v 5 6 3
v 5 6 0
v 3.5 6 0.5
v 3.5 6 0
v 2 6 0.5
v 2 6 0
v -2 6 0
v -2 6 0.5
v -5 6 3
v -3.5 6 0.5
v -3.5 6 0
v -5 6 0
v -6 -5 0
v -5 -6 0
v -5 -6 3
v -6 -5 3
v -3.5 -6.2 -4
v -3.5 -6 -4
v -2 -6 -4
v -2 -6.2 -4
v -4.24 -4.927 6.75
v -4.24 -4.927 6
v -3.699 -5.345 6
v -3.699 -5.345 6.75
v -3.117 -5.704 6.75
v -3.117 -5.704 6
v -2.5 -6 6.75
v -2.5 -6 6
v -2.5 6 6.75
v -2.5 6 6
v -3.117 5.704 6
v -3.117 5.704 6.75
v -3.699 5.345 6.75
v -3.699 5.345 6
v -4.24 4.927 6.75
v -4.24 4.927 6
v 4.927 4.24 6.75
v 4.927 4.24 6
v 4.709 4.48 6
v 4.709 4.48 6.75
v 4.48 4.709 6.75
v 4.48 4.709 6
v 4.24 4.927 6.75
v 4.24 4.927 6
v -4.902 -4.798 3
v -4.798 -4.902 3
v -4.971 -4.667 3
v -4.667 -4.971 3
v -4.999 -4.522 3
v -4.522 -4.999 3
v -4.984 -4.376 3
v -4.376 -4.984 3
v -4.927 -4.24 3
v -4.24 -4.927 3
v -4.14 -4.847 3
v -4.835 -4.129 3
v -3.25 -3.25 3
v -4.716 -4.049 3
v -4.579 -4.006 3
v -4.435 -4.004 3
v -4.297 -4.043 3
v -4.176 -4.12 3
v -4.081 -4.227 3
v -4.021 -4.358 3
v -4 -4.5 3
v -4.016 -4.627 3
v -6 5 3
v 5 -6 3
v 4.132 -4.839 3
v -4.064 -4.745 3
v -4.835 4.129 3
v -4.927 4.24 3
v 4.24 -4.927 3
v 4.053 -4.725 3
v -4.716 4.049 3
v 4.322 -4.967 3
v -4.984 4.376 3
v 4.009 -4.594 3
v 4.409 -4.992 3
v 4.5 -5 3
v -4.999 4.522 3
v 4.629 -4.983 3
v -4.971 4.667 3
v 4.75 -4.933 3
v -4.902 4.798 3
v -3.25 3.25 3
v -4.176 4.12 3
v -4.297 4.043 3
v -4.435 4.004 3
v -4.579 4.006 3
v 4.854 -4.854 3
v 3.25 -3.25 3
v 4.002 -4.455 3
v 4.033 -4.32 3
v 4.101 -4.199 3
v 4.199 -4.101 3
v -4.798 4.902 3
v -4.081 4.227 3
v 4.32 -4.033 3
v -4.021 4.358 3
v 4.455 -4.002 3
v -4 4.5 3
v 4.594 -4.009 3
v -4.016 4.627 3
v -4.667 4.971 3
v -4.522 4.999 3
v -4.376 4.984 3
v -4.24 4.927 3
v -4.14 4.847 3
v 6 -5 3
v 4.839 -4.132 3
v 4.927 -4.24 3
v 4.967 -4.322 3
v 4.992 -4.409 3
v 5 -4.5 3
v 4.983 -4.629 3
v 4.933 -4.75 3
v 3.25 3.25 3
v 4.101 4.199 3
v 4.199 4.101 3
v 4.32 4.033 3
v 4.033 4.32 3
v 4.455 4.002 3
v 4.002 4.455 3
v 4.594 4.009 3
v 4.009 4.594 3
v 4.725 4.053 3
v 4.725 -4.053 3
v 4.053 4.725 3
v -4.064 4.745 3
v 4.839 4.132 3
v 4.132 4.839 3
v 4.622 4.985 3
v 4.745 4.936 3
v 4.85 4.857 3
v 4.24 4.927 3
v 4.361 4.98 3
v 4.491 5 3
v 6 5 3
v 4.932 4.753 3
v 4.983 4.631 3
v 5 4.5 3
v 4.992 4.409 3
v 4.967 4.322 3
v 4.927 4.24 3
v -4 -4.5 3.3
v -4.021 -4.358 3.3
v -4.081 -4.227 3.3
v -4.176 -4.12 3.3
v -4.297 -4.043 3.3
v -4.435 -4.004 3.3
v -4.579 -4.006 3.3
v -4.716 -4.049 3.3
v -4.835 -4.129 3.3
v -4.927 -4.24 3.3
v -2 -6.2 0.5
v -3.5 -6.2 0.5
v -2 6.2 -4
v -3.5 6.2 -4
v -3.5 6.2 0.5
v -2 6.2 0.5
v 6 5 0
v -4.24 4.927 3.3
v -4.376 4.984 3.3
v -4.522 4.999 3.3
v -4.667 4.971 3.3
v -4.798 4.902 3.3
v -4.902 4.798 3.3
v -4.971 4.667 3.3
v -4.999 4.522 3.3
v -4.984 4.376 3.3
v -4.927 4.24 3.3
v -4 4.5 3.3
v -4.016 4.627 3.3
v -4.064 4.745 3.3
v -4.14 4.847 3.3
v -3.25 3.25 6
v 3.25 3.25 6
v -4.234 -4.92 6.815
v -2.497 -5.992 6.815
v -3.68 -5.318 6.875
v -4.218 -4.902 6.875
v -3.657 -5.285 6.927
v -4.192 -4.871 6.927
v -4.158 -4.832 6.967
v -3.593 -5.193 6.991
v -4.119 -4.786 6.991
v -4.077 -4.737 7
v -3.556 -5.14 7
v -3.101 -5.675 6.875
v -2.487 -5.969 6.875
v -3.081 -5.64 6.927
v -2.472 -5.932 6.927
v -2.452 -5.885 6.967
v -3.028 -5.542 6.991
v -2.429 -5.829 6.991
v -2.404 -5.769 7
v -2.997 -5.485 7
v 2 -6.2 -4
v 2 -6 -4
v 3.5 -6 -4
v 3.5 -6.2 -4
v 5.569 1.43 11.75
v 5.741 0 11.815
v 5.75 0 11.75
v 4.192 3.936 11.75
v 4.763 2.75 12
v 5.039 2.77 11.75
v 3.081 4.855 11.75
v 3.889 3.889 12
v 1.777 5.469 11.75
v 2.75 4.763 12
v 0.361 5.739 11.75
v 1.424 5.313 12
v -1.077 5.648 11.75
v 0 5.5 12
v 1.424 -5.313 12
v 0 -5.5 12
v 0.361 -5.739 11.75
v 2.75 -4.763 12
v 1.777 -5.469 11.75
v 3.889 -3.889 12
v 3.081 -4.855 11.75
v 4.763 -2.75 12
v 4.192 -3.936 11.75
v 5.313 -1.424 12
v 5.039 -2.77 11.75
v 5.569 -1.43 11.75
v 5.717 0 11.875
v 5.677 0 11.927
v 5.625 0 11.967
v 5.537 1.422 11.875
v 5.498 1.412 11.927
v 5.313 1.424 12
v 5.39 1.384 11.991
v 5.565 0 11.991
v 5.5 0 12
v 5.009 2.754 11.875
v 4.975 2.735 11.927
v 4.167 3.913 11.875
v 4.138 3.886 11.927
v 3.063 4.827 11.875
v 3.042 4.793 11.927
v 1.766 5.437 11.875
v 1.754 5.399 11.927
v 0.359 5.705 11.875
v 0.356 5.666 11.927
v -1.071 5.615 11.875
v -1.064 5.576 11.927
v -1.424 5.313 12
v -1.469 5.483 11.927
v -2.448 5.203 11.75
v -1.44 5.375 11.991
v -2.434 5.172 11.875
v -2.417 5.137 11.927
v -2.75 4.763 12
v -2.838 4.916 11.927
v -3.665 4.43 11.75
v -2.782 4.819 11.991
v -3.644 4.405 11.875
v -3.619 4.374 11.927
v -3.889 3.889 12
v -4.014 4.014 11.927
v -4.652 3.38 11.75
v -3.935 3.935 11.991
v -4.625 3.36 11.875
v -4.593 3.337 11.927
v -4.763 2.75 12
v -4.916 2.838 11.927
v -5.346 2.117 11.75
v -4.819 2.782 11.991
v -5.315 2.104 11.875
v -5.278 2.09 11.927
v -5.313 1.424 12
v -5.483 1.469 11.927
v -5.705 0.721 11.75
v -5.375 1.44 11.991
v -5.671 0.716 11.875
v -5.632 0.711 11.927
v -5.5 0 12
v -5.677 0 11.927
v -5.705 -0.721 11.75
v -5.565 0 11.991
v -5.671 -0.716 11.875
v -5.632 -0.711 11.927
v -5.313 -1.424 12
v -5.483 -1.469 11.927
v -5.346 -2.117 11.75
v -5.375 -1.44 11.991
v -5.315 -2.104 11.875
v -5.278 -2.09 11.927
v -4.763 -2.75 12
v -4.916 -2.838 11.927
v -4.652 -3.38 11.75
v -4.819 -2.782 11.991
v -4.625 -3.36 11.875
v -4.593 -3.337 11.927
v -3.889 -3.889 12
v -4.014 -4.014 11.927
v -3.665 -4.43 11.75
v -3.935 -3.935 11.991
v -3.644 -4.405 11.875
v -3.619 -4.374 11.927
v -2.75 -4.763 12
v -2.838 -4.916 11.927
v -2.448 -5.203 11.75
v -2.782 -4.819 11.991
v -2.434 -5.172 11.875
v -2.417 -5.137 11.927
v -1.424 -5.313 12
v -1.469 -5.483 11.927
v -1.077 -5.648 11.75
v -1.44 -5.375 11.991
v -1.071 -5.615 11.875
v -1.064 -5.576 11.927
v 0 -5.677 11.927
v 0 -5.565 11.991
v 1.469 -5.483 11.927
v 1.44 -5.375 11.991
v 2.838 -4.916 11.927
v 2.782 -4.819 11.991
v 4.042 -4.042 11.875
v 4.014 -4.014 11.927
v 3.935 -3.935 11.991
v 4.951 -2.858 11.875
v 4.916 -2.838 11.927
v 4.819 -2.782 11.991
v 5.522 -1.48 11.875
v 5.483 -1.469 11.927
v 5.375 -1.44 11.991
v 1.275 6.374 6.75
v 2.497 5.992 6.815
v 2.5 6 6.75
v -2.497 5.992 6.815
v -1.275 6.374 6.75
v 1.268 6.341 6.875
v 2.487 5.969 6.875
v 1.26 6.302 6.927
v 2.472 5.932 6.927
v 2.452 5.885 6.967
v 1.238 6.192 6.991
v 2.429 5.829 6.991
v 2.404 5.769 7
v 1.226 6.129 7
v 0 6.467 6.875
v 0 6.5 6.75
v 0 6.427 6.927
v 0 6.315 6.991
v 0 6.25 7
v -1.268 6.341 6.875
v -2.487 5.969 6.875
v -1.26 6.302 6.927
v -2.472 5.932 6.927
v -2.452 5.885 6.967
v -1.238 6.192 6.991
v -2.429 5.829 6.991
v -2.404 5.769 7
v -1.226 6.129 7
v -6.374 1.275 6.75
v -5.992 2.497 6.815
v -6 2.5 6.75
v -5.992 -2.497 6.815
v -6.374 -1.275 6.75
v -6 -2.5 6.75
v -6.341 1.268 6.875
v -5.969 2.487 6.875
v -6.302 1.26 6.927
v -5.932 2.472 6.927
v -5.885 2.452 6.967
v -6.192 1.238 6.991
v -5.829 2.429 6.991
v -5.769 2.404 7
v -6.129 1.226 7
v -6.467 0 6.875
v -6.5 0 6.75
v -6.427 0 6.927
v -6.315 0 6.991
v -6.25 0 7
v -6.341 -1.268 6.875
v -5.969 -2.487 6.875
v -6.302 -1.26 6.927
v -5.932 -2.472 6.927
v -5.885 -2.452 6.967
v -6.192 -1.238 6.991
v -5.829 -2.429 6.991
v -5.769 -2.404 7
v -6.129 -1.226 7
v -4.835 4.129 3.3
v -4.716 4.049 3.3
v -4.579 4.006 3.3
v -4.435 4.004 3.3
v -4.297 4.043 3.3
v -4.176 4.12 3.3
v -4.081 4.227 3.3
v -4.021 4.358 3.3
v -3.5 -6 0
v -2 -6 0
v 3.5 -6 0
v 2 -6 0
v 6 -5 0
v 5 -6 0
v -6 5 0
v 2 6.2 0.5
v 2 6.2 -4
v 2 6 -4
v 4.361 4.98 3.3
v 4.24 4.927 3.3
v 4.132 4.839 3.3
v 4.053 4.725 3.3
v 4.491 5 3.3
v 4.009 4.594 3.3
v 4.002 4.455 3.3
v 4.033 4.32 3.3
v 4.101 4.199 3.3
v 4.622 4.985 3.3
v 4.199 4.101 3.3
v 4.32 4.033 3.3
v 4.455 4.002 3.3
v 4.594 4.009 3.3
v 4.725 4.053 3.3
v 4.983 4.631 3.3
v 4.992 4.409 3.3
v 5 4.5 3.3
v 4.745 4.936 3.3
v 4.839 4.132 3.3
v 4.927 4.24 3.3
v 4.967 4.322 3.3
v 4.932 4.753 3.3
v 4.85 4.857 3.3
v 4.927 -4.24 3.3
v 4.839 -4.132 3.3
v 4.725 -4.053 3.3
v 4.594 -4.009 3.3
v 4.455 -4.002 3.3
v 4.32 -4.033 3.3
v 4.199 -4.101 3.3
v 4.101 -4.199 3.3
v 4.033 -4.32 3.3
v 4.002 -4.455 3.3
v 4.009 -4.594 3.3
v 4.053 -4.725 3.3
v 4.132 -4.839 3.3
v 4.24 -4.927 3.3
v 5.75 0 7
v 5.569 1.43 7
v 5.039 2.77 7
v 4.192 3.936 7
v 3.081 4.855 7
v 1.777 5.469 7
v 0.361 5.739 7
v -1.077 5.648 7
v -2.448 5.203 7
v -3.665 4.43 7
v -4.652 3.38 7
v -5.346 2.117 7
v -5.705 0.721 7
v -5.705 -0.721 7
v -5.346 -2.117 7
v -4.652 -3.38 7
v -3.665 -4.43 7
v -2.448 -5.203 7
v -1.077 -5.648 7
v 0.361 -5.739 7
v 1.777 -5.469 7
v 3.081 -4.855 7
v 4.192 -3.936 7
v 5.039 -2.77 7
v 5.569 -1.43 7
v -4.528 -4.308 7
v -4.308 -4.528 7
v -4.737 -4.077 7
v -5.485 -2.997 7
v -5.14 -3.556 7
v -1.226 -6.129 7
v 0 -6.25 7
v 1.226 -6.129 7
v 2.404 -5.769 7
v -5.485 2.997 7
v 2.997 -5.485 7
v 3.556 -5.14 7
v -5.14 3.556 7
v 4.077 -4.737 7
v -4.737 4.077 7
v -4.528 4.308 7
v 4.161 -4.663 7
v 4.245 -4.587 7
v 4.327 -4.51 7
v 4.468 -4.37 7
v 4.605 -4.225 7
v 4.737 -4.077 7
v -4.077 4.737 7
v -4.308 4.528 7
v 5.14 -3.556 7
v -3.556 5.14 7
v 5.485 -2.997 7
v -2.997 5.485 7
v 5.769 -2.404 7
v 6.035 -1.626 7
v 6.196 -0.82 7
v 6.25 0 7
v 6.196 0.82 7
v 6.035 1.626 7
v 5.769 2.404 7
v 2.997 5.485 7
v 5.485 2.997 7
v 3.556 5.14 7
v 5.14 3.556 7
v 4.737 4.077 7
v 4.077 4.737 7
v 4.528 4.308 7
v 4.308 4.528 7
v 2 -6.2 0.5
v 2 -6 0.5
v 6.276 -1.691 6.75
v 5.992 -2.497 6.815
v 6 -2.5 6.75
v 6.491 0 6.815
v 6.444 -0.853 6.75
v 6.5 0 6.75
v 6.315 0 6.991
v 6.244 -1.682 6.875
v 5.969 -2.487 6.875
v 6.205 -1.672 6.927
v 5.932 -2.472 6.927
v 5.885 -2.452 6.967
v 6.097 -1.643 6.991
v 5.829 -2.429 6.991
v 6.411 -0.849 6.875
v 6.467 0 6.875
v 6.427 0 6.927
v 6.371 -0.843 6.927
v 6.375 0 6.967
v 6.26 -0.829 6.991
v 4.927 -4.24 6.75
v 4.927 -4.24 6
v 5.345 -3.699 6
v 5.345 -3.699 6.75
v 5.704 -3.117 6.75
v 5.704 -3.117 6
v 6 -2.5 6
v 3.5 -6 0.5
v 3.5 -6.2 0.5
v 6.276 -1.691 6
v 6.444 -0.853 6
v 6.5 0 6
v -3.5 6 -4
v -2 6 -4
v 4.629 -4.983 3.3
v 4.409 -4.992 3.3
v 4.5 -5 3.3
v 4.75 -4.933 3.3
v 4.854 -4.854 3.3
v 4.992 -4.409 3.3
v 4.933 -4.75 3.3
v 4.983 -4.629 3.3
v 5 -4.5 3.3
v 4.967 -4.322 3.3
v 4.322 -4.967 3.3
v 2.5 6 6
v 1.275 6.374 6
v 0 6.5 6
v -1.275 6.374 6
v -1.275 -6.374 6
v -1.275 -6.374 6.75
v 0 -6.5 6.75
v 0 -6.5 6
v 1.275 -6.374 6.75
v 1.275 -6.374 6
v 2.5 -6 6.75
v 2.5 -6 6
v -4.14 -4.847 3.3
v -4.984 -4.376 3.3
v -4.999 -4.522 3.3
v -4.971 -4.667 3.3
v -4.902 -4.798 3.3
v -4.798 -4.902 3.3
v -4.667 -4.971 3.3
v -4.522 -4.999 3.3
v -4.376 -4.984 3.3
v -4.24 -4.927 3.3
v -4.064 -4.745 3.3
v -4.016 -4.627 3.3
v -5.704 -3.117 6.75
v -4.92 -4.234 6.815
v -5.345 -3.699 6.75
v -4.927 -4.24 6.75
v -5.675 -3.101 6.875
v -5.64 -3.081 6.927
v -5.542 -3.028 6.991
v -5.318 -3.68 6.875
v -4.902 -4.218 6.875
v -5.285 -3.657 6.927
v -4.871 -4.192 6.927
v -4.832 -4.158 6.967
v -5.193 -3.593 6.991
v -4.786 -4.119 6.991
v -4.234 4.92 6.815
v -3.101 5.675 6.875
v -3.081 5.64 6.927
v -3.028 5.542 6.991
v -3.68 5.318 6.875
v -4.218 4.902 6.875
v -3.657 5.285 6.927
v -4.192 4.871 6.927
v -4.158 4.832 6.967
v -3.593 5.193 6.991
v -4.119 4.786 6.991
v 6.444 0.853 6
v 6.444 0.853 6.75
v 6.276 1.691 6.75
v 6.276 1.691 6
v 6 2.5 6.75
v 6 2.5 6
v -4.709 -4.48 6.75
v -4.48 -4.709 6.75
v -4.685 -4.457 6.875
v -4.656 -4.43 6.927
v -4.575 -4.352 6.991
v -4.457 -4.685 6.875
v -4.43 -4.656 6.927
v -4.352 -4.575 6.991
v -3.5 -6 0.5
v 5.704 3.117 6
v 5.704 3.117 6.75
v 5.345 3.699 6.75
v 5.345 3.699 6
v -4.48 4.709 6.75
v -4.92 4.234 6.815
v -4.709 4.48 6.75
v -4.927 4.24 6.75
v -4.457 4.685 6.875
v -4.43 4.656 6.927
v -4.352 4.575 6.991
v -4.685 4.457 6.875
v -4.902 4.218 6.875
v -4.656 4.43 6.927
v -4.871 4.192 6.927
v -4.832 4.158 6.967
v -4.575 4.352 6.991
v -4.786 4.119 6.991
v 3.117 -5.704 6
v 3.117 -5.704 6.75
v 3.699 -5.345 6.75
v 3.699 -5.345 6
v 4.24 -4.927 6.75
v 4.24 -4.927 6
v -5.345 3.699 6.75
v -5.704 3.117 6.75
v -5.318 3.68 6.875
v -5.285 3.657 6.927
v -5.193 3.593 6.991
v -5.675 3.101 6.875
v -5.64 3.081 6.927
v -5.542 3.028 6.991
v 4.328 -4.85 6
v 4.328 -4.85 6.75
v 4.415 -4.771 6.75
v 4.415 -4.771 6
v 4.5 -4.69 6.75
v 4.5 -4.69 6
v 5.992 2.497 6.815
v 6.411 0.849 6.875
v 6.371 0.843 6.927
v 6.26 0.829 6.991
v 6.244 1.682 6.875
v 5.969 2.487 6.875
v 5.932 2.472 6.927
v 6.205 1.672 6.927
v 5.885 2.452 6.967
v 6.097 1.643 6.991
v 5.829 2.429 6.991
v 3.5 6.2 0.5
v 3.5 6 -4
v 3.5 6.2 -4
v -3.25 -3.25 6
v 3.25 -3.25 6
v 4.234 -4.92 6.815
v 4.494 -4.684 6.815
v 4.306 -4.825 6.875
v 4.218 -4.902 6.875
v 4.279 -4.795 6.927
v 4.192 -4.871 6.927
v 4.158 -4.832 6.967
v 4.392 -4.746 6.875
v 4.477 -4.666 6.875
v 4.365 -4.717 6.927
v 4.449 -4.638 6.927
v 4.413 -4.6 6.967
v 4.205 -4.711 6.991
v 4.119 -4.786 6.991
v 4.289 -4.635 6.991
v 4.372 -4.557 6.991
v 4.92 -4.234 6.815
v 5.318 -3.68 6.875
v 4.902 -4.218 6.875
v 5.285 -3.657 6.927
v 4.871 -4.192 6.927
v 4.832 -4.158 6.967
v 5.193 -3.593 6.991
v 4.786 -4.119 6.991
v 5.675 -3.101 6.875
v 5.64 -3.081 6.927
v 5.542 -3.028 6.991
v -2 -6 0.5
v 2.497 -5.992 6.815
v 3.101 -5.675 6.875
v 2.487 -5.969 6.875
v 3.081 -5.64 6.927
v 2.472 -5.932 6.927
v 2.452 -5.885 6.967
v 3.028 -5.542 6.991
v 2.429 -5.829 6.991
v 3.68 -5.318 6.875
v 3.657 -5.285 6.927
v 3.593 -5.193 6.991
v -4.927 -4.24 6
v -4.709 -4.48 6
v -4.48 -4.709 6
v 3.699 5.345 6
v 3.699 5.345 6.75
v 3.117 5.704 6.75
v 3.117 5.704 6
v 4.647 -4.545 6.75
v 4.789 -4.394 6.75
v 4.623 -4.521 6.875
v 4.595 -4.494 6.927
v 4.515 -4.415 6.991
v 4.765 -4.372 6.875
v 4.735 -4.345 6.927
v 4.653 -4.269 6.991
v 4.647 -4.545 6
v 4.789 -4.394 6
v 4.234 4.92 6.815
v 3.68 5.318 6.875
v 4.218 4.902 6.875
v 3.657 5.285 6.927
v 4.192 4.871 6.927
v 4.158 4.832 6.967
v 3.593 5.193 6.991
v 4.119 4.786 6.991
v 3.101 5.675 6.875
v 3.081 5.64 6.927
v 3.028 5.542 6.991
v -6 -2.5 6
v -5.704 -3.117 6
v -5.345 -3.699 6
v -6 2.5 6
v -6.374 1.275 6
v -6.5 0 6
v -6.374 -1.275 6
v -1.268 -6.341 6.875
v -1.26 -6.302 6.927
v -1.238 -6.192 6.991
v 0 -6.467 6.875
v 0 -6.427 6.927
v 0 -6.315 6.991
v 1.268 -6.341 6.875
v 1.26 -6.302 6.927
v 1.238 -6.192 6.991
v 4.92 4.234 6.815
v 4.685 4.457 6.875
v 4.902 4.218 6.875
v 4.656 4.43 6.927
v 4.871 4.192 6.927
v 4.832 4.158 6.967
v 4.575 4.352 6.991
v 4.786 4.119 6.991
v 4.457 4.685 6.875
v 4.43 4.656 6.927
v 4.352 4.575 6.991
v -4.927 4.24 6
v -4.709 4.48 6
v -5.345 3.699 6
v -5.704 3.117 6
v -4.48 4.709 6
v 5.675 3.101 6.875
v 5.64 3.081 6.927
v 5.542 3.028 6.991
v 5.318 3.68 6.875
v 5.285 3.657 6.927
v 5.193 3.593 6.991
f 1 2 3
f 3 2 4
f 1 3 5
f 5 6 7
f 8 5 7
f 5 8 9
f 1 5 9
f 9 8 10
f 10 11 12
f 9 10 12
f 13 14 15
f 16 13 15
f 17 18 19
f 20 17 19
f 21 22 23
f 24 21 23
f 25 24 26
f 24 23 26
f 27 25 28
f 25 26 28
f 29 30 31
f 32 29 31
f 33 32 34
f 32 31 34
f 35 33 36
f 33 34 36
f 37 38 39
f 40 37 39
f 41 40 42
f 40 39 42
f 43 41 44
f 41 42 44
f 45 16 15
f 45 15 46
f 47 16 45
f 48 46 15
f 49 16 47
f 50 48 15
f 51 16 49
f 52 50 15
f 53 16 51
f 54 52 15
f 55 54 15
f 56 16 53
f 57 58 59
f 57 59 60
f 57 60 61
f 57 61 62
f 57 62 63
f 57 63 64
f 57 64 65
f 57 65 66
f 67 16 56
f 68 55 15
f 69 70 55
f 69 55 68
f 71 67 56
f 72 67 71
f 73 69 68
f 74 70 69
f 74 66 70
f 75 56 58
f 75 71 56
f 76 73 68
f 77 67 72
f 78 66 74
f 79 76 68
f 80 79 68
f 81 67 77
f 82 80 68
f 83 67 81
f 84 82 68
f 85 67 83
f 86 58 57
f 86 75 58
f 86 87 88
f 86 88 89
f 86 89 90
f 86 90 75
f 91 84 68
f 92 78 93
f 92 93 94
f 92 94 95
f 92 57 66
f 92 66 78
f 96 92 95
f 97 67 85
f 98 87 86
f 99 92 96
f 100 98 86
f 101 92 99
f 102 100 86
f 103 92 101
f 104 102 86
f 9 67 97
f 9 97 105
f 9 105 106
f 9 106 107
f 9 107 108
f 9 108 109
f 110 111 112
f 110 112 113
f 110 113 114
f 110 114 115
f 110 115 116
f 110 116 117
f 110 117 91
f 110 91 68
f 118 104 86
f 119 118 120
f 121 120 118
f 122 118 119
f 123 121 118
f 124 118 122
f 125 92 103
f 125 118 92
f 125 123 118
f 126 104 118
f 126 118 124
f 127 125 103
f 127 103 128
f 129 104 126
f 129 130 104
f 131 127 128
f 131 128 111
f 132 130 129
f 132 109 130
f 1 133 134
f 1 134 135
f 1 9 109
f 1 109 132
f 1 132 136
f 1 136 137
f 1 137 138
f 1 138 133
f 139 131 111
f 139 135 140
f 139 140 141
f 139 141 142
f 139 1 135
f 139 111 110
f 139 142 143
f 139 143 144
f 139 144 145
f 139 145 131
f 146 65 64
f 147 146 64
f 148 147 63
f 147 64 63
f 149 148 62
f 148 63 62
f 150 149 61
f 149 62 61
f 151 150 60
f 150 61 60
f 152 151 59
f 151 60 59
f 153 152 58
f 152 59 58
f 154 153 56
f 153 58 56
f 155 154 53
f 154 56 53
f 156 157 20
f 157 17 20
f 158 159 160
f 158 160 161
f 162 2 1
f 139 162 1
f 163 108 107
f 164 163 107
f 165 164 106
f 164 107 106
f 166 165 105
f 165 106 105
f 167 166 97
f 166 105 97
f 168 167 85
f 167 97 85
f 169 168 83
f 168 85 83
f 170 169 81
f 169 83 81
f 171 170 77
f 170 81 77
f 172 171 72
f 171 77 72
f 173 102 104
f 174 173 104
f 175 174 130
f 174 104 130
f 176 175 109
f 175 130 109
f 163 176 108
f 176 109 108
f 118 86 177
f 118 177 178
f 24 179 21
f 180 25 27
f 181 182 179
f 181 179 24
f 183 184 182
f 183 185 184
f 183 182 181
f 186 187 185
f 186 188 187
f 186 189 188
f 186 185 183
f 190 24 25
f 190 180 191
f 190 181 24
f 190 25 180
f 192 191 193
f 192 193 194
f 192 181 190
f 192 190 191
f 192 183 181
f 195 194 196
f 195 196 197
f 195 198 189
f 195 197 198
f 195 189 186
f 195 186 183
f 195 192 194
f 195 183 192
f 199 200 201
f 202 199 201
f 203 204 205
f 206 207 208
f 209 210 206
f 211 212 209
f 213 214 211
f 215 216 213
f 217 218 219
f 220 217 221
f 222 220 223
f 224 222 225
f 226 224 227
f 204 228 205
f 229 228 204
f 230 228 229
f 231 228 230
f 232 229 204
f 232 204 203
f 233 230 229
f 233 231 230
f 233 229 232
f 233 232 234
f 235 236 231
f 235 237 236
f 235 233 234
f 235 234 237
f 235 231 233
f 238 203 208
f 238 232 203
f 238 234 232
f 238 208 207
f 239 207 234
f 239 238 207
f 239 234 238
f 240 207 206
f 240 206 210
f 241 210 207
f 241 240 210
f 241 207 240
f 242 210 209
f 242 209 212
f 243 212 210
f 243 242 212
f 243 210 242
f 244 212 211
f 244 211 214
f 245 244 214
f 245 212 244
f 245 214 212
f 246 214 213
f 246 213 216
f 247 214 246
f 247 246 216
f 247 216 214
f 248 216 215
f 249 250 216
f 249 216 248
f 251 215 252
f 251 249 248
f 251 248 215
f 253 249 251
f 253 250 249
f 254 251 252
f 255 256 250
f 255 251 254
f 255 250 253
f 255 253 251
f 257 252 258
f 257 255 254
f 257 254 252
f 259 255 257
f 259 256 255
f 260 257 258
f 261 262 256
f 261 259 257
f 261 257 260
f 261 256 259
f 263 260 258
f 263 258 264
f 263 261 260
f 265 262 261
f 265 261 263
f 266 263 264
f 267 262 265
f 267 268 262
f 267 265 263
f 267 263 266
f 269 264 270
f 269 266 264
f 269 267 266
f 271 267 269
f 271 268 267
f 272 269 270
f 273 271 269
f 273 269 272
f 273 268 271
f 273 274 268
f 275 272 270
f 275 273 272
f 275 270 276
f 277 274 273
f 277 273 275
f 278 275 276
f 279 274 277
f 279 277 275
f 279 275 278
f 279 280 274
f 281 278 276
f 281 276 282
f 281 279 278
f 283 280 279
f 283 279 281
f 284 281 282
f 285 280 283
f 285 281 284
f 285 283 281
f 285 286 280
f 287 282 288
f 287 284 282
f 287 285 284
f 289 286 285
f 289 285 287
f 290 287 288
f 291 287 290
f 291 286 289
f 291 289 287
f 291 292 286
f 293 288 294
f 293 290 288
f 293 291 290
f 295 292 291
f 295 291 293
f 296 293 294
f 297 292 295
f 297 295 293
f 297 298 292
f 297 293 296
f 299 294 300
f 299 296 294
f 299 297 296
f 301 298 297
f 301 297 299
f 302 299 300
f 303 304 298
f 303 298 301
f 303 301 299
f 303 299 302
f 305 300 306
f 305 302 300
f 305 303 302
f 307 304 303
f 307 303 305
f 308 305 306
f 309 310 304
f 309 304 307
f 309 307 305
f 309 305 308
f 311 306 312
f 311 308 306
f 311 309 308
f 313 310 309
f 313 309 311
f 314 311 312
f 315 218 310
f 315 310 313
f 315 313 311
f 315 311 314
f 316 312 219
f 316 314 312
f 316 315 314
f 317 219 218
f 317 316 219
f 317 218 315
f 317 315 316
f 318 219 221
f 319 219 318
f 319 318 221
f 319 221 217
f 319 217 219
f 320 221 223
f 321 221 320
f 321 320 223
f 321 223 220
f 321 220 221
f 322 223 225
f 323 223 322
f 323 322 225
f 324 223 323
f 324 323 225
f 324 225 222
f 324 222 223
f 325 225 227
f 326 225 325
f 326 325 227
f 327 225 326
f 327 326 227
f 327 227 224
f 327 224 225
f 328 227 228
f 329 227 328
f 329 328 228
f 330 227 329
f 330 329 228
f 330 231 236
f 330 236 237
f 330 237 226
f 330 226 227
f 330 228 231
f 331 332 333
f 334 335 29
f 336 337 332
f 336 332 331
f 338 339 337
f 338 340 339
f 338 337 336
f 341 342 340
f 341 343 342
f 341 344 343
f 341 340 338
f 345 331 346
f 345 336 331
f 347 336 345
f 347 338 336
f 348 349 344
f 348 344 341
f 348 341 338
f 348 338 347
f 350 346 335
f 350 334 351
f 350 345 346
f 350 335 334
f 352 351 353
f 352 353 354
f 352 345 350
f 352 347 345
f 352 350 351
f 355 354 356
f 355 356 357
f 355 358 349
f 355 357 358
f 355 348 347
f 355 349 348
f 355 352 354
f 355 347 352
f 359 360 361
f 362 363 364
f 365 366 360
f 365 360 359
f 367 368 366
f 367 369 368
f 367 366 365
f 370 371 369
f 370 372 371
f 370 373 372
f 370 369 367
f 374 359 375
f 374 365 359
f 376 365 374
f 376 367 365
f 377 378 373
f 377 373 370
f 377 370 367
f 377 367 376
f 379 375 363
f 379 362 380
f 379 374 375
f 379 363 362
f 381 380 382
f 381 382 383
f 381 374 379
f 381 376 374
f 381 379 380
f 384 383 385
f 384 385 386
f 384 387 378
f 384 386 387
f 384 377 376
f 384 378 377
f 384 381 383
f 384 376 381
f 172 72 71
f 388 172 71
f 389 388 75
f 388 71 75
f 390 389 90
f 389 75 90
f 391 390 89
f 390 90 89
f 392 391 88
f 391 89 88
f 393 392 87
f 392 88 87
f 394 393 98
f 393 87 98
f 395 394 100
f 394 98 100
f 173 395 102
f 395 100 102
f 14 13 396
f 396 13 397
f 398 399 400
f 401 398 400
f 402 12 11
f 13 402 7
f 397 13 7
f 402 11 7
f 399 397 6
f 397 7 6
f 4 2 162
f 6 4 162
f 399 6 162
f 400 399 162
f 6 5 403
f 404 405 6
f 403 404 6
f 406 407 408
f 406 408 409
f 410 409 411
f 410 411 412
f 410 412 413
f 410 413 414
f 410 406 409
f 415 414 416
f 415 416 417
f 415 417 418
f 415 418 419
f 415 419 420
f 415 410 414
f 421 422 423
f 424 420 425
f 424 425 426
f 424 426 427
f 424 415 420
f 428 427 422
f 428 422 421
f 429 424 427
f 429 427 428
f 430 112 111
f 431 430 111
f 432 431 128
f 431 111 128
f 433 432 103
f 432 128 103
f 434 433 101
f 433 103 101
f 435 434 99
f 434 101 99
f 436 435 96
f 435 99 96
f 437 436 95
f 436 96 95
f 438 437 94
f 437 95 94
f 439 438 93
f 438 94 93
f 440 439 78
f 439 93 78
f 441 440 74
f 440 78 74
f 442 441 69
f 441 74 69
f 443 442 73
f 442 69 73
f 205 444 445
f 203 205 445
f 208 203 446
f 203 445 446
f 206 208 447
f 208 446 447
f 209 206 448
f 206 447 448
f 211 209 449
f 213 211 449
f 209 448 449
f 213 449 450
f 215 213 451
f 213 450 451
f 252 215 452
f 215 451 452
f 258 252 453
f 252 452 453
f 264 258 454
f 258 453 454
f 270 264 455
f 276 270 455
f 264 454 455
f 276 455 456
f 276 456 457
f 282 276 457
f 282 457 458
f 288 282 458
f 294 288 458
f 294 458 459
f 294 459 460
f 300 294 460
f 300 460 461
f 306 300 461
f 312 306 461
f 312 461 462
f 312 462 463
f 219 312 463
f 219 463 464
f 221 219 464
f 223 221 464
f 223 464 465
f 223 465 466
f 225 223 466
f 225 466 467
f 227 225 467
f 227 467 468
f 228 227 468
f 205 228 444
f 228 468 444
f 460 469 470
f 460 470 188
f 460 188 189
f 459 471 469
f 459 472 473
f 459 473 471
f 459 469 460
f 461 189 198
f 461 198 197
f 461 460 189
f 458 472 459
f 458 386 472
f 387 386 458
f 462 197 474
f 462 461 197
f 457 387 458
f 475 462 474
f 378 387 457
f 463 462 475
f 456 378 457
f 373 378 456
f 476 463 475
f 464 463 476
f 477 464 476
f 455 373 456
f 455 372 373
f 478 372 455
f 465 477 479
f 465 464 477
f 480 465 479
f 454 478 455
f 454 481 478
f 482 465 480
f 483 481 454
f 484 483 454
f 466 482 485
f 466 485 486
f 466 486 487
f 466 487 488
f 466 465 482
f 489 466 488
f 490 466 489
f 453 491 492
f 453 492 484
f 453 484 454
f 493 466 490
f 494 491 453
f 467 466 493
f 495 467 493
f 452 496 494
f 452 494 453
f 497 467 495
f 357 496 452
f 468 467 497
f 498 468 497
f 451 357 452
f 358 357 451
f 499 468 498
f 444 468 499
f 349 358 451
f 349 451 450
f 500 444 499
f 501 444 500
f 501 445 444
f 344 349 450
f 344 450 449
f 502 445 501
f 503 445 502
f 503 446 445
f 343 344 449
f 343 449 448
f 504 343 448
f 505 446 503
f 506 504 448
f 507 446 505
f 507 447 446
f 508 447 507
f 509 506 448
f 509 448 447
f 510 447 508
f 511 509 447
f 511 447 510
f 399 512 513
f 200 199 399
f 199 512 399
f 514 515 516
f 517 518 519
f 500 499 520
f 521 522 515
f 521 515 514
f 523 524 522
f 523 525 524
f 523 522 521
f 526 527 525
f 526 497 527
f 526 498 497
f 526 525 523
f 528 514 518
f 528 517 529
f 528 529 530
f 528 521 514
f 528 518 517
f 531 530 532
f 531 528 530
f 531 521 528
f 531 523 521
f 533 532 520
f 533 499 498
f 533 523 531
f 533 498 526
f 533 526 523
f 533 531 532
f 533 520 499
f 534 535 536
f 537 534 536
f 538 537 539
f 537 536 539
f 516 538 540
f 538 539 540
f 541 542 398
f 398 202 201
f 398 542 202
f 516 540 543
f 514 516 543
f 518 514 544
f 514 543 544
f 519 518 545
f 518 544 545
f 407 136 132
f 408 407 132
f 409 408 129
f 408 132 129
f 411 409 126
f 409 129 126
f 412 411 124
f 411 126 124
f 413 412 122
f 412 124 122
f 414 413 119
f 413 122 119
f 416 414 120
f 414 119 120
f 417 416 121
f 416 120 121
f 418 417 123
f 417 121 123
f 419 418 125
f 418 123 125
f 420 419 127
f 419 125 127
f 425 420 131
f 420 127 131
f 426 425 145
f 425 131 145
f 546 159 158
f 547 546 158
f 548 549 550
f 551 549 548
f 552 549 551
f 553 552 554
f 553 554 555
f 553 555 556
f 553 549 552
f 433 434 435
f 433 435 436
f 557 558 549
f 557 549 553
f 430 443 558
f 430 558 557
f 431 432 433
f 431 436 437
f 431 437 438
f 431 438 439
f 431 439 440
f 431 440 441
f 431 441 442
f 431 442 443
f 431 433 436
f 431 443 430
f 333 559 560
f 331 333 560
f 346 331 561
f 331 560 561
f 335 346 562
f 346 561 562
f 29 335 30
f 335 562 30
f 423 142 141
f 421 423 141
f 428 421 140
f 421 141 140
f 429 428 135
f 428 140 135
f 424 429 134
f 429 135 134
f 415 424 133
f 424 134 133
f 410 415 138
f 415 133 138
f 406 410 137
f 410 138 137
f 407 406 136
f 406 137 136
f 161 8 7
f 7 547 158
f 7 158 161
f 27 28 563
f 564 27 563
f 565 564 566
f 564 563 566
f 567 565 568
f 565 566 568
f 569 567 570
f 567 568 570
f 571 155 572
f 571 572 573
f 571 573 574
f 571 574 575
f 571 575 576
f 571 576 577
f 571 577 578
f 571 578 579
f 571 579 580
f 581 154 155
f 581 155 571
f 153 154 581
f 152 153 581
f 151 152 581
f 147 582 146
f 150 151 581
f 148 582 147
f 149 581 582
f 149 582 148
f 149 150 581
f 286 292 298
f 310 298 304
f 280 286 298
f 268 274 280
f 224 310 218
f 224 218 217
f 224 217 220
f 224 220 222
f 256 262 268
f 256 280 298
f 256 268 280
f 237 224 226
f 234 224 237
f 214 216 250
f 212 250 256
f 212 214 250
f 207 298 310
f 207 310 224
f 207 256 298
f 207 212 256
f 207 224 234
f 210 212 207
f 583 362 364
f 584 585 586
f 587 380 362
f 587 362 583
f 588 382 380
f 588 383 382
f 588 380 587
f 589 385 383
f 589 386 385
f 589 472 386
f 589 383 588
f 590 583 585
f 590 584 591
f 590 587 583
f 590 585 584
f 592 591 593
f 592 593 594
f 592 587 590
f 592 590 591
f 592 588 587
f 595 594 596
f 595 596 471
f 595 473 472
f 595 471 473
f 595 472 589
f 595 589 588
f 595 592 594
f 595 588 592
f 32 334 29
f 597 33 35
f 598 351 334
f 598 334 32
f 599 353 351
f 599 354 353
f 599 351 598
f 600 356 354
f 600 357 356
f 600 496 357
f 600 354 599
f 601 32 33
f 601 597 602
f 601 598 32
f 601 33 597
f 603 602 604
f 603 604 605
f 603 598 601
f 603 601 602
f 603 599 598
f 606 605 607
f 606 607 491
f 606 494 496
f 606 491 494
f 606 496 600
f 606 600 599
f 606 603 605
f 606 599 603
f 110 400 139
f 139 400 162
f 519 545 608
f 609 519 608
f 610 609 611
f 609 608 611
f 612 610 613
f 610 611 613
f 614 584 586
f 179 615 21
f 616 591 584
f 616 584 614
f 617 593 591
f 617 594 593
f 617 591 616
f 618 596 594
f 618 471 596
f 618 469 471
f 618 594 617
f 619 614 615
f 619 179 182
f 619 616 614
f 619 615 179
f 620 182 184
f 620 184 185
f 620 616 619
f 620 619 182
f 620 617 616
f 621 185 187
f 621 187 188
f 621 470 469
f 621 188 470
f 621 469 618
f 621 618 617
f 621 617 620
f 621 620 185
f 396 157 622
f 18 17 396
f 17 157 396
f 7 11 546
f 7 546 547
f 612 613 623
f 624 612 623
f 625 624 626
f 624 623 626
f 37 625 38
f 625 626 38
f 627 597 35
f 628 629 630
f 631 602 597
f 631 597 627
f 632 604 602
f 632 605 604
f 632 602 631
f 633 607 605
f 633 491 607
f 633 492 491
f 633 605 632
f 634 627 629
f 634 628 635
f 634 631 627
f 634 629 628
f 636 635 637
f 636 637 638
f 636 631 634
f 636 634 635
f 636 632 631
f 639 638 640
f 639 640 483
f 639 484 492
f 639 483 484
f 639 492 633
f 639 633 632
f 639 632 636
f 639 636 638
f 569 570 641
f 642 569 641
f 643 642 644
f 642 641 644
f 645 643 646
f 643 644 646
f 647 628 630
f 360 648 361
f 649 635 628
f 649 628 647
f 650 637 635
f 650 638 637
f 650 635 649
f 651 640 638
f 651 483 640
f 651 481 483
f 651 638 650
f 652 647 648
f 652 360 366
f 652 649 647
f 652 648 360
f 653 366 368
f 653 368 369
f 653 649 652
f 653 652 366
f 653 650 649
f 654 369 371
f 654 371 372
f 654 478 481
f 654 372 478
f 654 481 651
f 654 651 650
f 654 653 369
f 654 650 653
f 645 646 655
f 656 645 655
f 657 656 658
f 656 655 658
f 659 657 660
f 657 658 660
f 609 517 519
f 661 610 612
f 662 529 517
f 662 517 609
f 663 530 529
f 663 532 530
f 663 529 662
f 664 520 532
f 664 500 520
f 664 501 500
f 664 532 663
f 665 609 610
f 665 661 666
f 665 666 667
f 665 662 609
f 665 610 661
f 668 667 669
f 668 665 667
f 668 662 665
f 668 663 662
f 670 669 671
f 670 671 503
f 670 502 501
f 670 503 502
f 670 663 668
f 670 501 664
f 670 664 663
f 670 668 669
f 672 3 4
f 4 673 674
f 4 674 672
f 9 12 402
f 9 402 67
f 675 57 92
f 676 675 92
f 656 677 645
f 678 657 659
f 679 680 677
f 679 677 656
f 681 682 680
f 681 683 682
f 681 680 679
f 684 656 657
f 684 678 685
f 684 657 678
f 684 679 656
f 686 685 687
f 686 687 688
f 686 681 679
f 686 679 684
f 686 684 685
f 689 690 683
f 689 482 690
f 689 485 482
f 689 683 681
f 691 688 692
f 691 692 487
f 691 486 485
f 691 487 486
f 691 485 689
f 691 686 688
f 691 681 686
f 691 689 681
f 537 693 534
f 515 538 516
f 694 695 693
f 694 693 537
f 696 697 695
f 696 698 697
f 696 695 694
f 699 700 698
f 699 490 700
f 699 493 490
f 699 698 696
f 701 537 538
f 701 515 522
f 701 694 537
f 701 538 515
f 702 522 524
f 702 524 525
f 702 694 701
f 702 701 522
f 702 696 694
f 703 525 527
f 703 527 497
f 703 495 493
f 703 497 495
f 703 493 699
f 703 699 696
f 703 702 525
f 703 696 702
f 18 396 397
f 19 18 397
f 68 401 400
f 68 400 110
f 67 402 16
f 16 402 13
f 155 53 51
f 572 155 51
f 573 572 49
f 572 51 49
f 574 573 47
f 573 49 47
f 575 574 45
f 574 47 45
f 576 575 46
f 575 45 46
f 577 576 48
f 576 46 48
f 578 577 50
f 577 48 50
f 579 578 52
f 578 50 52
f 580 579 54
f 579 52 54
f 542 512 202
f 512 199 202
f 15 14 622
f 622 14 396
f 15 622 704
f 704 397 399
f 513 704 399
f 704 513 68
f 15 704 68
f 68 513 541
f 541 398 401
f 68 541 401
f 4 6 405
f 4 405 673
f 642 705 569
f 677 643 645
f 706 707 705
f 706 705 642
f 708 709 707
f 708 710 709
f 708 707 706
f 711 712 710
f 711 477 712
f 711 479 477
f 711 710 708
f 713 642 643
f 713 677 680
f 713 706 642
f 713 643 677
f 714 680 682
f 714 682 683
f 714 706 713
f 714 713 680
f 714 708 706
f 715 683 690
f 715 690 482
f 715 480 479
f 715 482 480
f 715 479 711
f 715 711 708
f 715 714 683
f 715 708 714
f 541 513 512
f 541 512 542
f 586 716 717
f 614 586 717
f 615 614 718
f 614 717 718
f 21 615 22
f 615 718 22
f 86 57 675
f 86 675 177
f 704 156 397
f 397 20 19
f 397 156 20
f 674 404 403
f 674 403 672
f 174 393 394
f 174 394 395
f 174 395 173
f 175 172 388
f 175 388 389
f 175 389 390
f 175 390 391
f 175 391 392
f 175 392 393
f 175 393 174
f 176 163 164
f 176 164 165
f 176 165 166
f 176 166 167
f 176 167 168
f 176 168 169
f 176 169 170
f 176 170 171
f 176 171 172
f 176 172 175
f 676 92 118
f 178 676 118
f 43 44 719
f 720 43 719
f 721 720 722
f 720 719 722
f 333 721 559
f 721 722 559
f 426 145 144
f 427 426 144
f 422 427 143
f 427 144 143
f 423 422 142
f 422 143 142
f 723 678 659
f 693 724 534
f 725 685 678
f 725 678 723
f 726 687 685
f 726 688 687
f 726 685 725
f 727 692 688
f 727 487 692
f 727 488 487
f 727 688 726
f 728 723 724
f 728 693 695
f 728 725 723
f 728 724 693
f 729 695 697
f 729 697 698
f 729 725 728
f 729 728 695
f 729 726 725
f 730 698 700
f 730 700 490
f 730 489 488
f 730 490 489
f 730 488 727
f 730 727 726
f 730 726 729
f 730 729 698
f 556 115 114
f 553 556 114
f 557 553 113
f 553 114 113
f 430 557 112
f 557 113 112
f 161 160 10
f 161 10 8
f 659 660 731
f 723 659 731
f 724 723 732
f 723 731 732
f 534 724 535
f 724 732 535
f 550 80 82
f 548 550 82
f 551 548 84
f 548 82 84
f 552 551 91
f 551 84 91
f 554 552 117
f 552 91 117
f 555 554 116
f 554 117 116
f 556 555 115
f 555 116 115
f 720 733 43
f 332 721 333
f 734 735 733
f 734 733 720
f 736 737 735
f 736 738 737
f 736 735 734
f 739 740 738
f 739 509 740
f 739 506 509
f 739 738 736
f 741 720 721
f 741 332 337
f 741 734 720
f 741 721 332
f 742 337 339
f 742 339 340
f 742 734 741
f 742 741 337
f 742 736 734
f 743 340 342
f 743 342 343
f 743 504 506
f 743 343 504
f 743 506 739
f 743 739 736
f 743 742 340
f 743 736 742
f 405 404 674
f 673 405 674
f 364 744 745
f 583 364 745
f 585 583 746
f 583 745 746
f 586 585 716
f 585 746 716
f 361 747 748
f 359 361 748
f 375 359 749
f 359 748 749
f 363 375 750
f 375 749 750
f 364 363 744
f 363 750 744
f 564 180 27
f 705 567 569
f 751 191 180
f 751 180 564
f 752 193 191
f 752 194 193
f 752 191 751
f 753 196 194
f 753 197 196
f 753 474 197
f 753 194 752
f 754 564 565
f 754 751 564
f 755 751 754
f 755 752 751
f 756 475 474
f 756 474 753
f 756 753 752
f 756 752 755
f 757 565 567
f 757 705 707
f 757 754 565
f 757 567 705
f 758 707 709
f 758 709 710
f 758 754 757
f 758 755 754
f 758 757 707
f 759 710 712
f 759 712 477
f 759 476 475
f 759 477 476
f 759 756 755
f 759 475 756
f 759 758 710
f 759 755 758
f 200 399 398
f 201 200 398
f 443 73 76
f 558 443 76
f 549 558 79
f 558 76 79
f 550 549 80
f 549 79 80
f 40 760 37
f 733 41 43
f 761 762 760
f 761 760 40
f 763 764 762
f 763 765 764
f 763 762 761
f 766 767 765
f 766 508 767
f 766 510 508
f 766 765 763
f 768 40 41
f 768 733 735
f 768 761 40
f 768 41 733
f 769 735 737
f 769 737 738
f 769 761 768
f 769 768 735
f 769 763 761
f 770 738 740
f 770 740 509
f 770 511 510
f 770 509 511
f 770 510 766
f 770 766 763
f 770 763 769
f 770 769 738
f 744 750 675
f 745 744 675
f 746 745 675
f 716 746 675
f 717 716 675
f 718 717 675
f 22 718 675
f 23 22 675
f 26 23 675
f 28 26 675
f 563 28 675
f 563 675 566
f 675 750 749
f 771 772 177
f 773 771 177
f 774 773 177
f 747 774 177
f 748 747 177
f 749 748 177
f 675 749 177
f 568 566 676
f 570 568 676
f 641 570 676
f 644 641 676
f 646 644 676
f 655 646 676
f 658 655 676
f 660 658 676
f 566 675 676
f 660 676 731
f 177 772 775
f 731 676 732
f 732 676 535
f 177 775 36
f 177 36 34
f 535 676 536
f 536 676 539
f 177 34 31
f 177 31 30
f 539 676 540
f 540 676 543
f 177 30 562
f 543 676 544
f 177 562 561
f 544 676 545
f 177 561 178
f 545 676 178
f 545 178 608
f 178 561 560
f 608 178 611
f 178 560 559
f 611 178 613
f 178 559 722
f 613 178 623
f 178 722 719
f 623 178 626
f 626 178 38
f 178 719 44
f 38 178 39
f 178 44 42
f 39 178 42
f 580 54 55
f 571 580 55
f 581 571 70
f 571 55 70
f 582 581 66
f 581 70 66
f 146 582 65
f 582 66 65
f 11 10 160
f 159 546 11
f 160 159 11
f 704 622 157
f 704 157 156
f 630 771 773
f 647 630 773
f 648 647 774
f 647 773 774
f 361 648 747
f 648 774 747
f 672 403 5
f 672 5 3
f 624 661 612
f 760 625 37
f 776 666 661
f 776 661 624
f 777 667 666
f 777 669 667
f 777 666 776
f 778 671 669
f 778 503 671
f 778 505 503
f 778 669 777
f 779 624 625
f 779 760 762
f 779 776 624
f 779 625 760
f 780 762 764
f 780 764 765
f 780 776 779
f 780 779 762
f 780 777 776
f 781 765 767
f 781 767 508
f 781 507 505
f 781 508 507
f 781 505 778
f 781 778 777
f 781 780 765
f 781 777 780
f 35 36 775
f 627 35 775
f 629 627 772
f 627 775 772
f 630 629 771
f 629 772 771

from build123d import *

# Parameters (mm, degrees)
F0_R          = 5.75
F0_W          = 6.5
F0_H          = 6.5
F1_DEPTH      = 3
F2_DEPTH      = 6
F3_START      = 6
F3_DEPTH      = 6
F4_START      = 6
F4_DEPTH      = 1
F5_W          = 1.5
F5_H          = 0.2
F6_DEPTH      = 4
F6_DEPTH_BACK = 0.5
F7_SIZE       = 1
F8_DEPTH      = 3.3
F9_R          = 0.25


with BuildPart() as f1:
    # F0 (on Top) → F1 (new body)
    with BuildSketch(Plane.XY):
        with BuildLine():
            ThreePointArc((4.2397411979, 4.9269254688), (3.4123159424, 5.5322780036), (2.5, 6))
            Line((2.5, 6), (-2.5, 6))
            ThreePointArc((-2.5, 6), (-3.4123159424, 5.5322780036), (-4.2397411979, 4.9269254688))
            ThreePointArc((-4.2397411979, 4.9269254688), (-4.0640358954, 4.7448168692), (-4, 4.5))
            ThreePointArc((-4, 4.5), (-4.3648384936, 4.0186151569), (-4.9269254688, 4.2397411979))
            ThreePointArc((-4.9269254688, 4.2397411979), (-5.5322780036, 3.4123159424), (-6, 2.5))
            Line((-6, 2.5), (-6, -2.5))
            ThreePointArc((-6, -2.5), (-5.5322780036, -3.4123159424), (-4.9269254688, -4.2397411979))
            ThreePointArc((-4.9269254688, -4.2397411979), (-4.3648384936, -4.0186151569), (-4, -4.5))
            ThreePointArc((-4, -4.5), (-4.0640358954, -4.7448168692), (-4.2397411979, -4.9269254688))
            ThreePointArc((-4.2397411979, -4.9269254688), (-3.4123159424, -5.5322780036), (-2.5, -6))
            Line((-2.5, -6), (2.5, -6))
            ThreePointArc((2.5, -6), (3.4123159424, -5.5322780036), (4.2397411979, -4.9269254688))
            ThreePointArc((4.2397411979, -4.9269254688), (4.1464466094, -4.1464466094), (4.9269254688, -4.2397411979))
            ThreePointArc((4.9269254688, -4.2397411979), (5.5322780036, -3.4123159424), (6, -2.5))
            Line((6, -2.5), (6, 2.5))
            ThreePointArc((6, 2.5), (5.5322780036, 3.4123159424), (4.9269254688, 4.2397411979))
            ThreePointArc((4.9269254688, 4.2397411979), (4.1464466094, 4.1464466094), (4.2397411979, 4.9269254688))
        make_face()
        Circle(F0_R, mode=Mode.SUBTRACT)
        Circle(F0_R)
        Rectangle(F0_W, F0_H, mode=Mode.SUBTRACT)
        Rectangle(F0_W, F0_H)
        with BuildLine():
            ThreePointArc((-4.2397411979, 4.9269254688), (-3.4123159424, 5.5322780036), (-2.5, 6))
            Line((-2.5, 6), (-6, 6))
            Line((-6, 6), (-6, 2.5))
            ThreePointArc((-6, 2.5), (-5.5322780036, 3.4123159424), (-4.9269254688, 4.2397411979))
            ThreePointArc((-4.9269254688, 4.2397411979), (-4.8535533906, 4.8535533906), (-4.2397411979, 4.9269254688))
        make_face()
        with BuildLine():
            Line((6, 2.5), (6, 6))
            Line((6, 6), (2.5, 6))
            ThreePointArc((2.5, 6), (3.4123159424, 5.5322780036), (4.2397411979, 4.9269254688))
            ThreePointArc((4.2397411979, 4.9269254688), (4.7448168692, 4.9359641046), (5, 4.5))
            ThreePointArc((5, 4.5), (4.9813848431, 4.3648384936), (4.9269254688, 4.2397411979))
            ThreePointArc((4.9269254688, 4.2397411979), (5.5322780036, 3.4123159424), (6, 2.5))
        make_face()
        with BuildLine():
            ThreePointArc((-4.9269254688, -4.2397411979), (-5.5322780036, -3.4123159424), (-6, -2.5))
            Line((-6, -2.5), (-6, -6))
            Line((-6, -6), (-2.5, -6))
            ThreePointArc((-2.5, -6), (-3.4123159424, -5.5322780036), (-4.2397411979, -4.9269254688))
            ThreePointArc((-4.2397411979, -4.9269254688), (-4.8535533906, -4.8535533906), (-4.9269254688, -4.2397411979))
        make_face()
        with BuildLine():
            Line((6, -6), (6, -2.5))
            ThreePointArc((6, -2.5), (5.5322780036, -3.4123159424), (4.9269254688, -4.2397411979))
            ThreePointArc((4.9269254688, -4.2397411979), (4.9813848431, -4.3648384936), (5, -4.5))
            ThreePointArc((5, -4.5), (4.8535533906, -4.8535533906), (4.5, -5))
            Line((4.5, -5), (4.5, -6))
            Line((4.5, -6), (6, -6))
        make_face()
        with BuildLine():
            Line((2.5, -6), (4.5, -6))
            Line((4.5, -6), (4.5, -5))
            ThreePointArc((4.5, -5), (4.3648384936, -4.9813848431), (4.2397411979, -4.9269254688))
            ThreePointArc((4.2397411979, -4.9269254688), (3.4123159424, -5.5322780036), (2.5, -6))
        make_face()
        with BuildLine():
            ThreePointArc((4.9269254688, 4.2397411979), (4.5961940777, 4.5961940777), (4.2397411979, 4.9269254688))
            ThreePointArc((4.2397411979, 4.9269254688), (4.1464466094, 4.1464466094), (4.9269254688, 4.2397411979))
        make_face()
        with BuildLine():
            ThreePointArc((-4, 4.5), (-4.0640358954, 4.7448168692), (-4.2397411979, 4.9269254688))
            ThreePointArc((-4.2397411979, 4.9269254688), (-4.5961940777, 4.5961940777), (-4.9269254688, 4.2397411979))
            ThreePointArc((-4.9269254688, 4.2397411979), (-4.3648384936, 4.0186151569), (-4, 4.5))
        make_face()
        with BuildLine():
            ThreePointArc((-4, -4.5), (-4.3648384936, -4.0186151569), (-4.9269254688, -4.2397411979))
            ThreePointArc((-4.9269254688, -4.2397411979), (-4.5961940777, -4.5961940777), (-4.2397411979, -4.9269254688))
            ThreePointArc((-4.2397411979, -4.9269254688), (-4.0640358954, -4.7448168692), (-4, -4.5))
        make_face()
        with BuildLine():
            ThreePointArc((4.5, -4.6904157598), (4.7188460283, -4.4701780905), (4.9269254688, -4.2397411979))
            ThreePointArc((4.9269254688, -4.2397411979), (4.1464466094, -4.1464466094), (4.2397411979, -4.9269254688))
            ThreePointArc((4.2397411979, -4.9269254688), (4.3714703776, -4.8104310345), (4.5, -4.6904157598))
        make_face()
        with BuildLine():
            ThreePointArc((5, 4.5), (4.7448168692, 4.9359641046), (4.2397411979, 4.9269254688))
            ThreePointArc((4.2397411979, 4.9269254688), (4.5961940777, 4.5961940777), (4.9269254688, 4.2397411979))
            ThreePointArc((4.9269254688, 4.2397411979), (4.9813848431, 4.3648384936), (5, 4.5))
        make_face()
        with BuildLine():
            ThreePointArc((-4.9269254688, 4.2397411979), (-4.5961940777, 4.5961940777), (-4.2397411979, 4.9269254688))
            ThreePointArc((-4.2397411979, 4.9269254688), (-4.8535533906, 4.8535533906), (-4.9269254688, 4.2397411979))
        make_face()
        with BuildLine():
            ThreePointArc((-4.2397411979, -4.9269254688), (-4.5961940777, -4.5961940777), (-4.9269254688, -4.2397411979))
            ThreePointArc((-4.9269254688, -4.2397411979), (-4.8535533906, -4.8535533906), (-4.2397411979, -4.9269254688))
        make_face()
        with BuildLine():
            ThreePointArc((5, -4.5), (4.9813848431, -4.3648384936), (4.9269254688, -4.2397411979))
            ThreePointArc((4.9269254688, -4.2397411979), (4.7188460283, -4.4701780905), (4.5, -4.6904157598))
            Line((4.5, -4.6904157598), (4.5, -5))
            ThreePointArc((4.5, -5), (4.8535533906, -4.8535533906), (5, -4.5))
        make_face()
        with BuildLine():
            Line((4.5, -5), (4.5, -4.6904157598))
            ThreePointArc((4.5, -4.6904157598), (4.3714703776, -4.8104310345), (4.2397411979, -4.9269254688))
            ThreePointArc((4.2397411979, -4.9269254688), (4.3648384936, -4.9813848431), (4.5, -5))
        make_face()
    extrude(amount=F1_DEPTH)

    # F0 (on Top) → F2 (join)
    with BuildSketch(Plane.XY):
        Rectangle(F0_W, F0_H)
    extrude(amount=F2_DEPTH)

    # F0 (on Top) → F3 (join)
    with BuildSketch(Plane.XY.offset(F3_START)):
        Circle(F0_R)
        Rectangle(F0_W, F0_H, mode=Mode.SUBTRACT)
        Rectangle(F0_W, F0_H)
    extrude(amount=F3_DEPTH)

    # F0 (on Top) → F4 (join)
    with BuildSketch(Plane.XY.offset(F4_START)):
        with BuildLine():
            ThreePointArc((4.2397411979, 4.9269254688), (3.4123159424, 5.5322780036), (2.5, 6))
            Line((2.5, 6), (-2.5, 6))
            ThreePointArc((-2.5, 6), (-3.4123159424, 5.5322780036), (-4.2397411979, 4.9269254688))
            ThreePointArc((-4.2397411979, 4.9269254688), (-4.0640358954, 4.7448168692), (-4, 4.5))
            ThreePointArc((-4, 4.5), (-4.3648384936, 4.0186151569), (-4.9269254688, 4.2397411979))
            ThreePointArc((-4.9269254688, 4.2397411979), (-5.5322780036, 3.4123159424), (-6, 2.5))
            Line((-6, 2.5), (-6, -2.5))
            ThreePointArc((-6, -2.5), (-5.5322780036, -3.4123159424), (-4.9269254688, -4.2397411979))
            ThreePointArc((-4.9269254688, -4.2397411979), (-4.3648384936, -4.0186151569), (-4, -4.5))
            ThreePointArc((-4, -4.5), (-4.0640358954, -4.7448168692), (-4.2397411979, -4.9269254688))
            ThreePointArc((-4.2397411979, -4.9269254688), (-3.4123159424, -5.5322780036), (-2.5, -6))
            Line((-2.5, -6), (2.5, -6))
            ThreePointArc((2.5, -6), (3.4123159424, -5.5322780036), (4.2397411979, -4.9269254688))
            ThreePointArc((4.2397411979, -4.9269254688), (4.1464466094, -4.1464466094), (4.9269254688, -4.2397411979))
            ThreePointArc((4.9269254688, -4.2397411979), (5.5322780036, -3.4123159424), (6, -2.5))
            Line((6, -2.5), (6, 2.5))
            ThreePointArc((6, 2.5), (5.5322780036, 3.4123159424), (4.9269254688, 4.2397411979))
            ThreePointArc((4.9269254688, 4.2397411979), (4.1464466094, 4.1464466094), (4.2397411979, 4.9269254688))
        make_face()
        Circle(F0_R, mode=Mode.SUBTRACT)
        with BuildLine():
            Line((-2.5, 6), (2.5, 6))
            ThreePointArc((2.5, 6), (0, 6.5), (-2.5, 6))
        make_face()
        with BuildLine():
            ThreePointArc((6.5, 0), (6.373774392, 1.2747548784), (6, 2.5))
            Line((6, 2.5), (6, -2.5))
            ThreePointArc((6, -2.5), (6.373774392, -1.2747548784), (6.5, 0))
        make_face()
        with BuildLine():
            ThreePointArc((-2.5, -6), (0, -6.5), (2.5, -6))
            Line((2.5, -6), (-2.5, -6))
        make_face()
        with BuildLine():
            Line((-6, -2.5), (-6, 2.5))
            ThreePointArc((-6, 2.5), (-6.5, 0), (-6, -2.5))
        make_face()
        with BuildLine():
            ThreePointArc((4.5, -4.6904157598), (4.7188460283, -4.4701780905), (4.9269254688, -4.2397411979))
            ThreePointArc((4.9269254688, -4.2397411979), (4.1464466094, -4.1464466094), (4.2397411979, -4.9269254688))
            ThreePointArc((4.2397411979, -4.9269254688), (4.3714703776, -4.8104310345), (4.5, -4.6904157598))
        make_face()
        with BuildLine():
            ThreePointArc((-4, -4.5), (-4.3648384936, -4.0186151569), (-4.9269254688, -4.2397411979))
            ThreePointArc((-4.9269254688, -4.2397411979), (-4.5961940777, -4.5961940777), (-4.2397411979, -4.9269254688))
            ThreePointArc((-4.2397411979, -4.9269254688), (-4.0640358954, -4.7448168692), (-4, -4.5))
        make_face()
        with BuildLine():
            ThreePointArc((-4, 4.5), (-4.0640358954, 4.7448168692), (-4.2397411979, 4.9269254688))
            ThreePointArc((-4.2397411979, 4.9269254688), (-4.5961940777, 4.5961940777), (-4.9269254688, 4.2397411979))
            ThreePointArc((-4.9269254688, 4.2397411979), (-4.3648384936, 4.0186151569), (-4, 4.5))
        make_face()
        with BuildLine():
            ThreePointArc((4.9269254688, 4.2397411979), (4.5961940777, 4.5961940777), (4.2397411979, 4.9269254688))
            ThreePointArc((4.2397411979, 4.9269254688), (4.1464466094, 4.1464466094), (4.9269254688, 4.2397411979))
        make_face()
    extrude(amount=F4_DEPTH)

    # F5 (on Top) → F6 (join, two sides)
    with BuildSketch(Plane.XY) as f6_sk:
        with Locations((-2.75, -6.1)):
            Rectangle(F5_W, F5_H)
        with Locations((2.75, -6.1)):
            Rectangle(F5_W, F5_H)
        with Locations((2.75, 6.1)):
            Rectangle(F5_W, F5_H)
        with Locations((-2.75, 6.1)):
            Rectangle(F5_W, F5_H)
    extrude(amount=-F6_DEPTH)
    extrude(f6_sk.sketch, amount=F6_DEPTH_BACK)

    # F7
    f7_edges = [f1.edges().sort_by_distance(p)[0] for p in [
        (-6, -6, 1.5),
        (6, -6, 1.5),
        (6, 6, 1.5),
        (-6, 6, 1.5),
    ]]
    chamfer(f7_edges, length=F7_SIZE)

    # F0 (on Top) → F8 (join)
    with BuildSketch(Plane.XY):
        with BuildLine():
            ThreePointArc((4.5, -4.6904157598), (4.7188460283, -4.4701780905), (4.9269254688, -4.2397411979))
            ThreePointArc((4.9269254688, -4.2397411979), (4.1464466094, -4.1464466094), (4.2397411979, -4.9269254688))
            ThreePointArc((4.2397411979, -4.9269254688), (4.3714703776, -4.8104310345), (4.5, -4.6904157598))
        make_face()
        with BuildLine():
            ThreePointArc((5, -4.5), (4.9813848431, -4.3648384936), (4.9269254688, -4.2397411979))
            ThreePointArc((4.9269254688, -4.2397411979), (4.7188460283, -4.4701780905), (4.5, -4.6904157598))
            Line((4.5, -4.6904157598), (4.5, -5))
            ThreePointArc((4.5, -5), (4.8535533906, -4.8535533906), (5, -4.5))
        make_face()
        with BuildLine():
            Line((4.5, -5), (4.5, -4.6904157598))
            ThreePointArc((4.5, -4.6904157598), (4.3714703776, -4.8104310345), (4.2397411979, -4.9269254688))
            ThreePointArc((4.2397411979, -4.9269254688), (4.3648384936, -4.9813848431), (4.5, -5))
        make_face()
        with BuildLine():
            ThreePointArc((4.9269254688, 4.2397411979), (4.5961940777, 4.5961940777), (4.2397411979, 4.9269254688))
            ThreePointArc((4.2397411979, 4.9269254688), (4.1464466094, 4.1464466094), (4.9269254688, 4.2397411979))
        make_face()
        with BuildLine():
            ThreePointArc((5, 4.5), (4.7448168692, 4.9359641046), (4.2397411979, 4.9269254688))
            ThreePointArc((4.2397411979, 4.9269254688), (4.5961940777, 4.5961940777), (4.9269254688, 4.2397411979))
            ThreePointArc((4.9269254688, 4.2397411979), (4.9813848431, 4.3648384936), (5, 4.5))
        make_face()
        with BuildLine():
            ThreePointArc((-4.9269254688, 4.2397411979), (-4.5961940777, 4.5961940777), (-4.2397411979, 4.9269254688))
            ThreePointArc((-4.2397411979, 4.9269254688), (-4.8535533906, 4.8535533906), (-4.9269254688, 4.2397411979))
        make_face()
        with BuildLine():
            ThreePointArc((-4, 4.5), (-4.0640358954, 4.7448168692), (-4.2397411979, 4.9269254688))
            ThreePointArc((-4.2397411979, 4.9269254688), (-4.5961940777, 4.5961940777), (-4.9269254688, 4.2397411979))
            ThreePointArc((-4.9269254688, 4.2397411979), (-4.3648384936, 4.0186151569), (-4, 4.5))
        make_face()
        with BuildLine():
            ThreePointArc((-4, -4.5), (-4.3648384936, -4.0186151569), (-4.9269254688, -4.2397411979))
            ThreePointArc((-4.9269254688, -4.2397411979), (-4.5961940777, -4.5961940777), (-4.2397411979, -4.9269254688))
            ThreePointArc((-4.2397411979, -4.9269254688), (-4.0640358954, -4.7448168692), (-4, -4.5))
        make_face()
        with BuildLine():
            ThreePointArc((-4.2397411979, -4.9269254688), (-4.5961940777, -4.5961940777), (-4.9269254688, -4.2397411979))
            ThreePointArc((-4.9269254688, -4.2397411979), (-4.8535533906, -4.8535533906), (-4.2397411979, -4.9269254688))
        make_face()
    extrude(amount=F8_DEPTH)

    # F9
    f9_edges = [f1.edges().sort_by_distance(p)[0] for p in [
        (-5.75, 0, 12),
        (-4.926925, -4.239741, 7),
    ]]
    fillet(f9_edges, radius=F9_R)


solid = f1.part
